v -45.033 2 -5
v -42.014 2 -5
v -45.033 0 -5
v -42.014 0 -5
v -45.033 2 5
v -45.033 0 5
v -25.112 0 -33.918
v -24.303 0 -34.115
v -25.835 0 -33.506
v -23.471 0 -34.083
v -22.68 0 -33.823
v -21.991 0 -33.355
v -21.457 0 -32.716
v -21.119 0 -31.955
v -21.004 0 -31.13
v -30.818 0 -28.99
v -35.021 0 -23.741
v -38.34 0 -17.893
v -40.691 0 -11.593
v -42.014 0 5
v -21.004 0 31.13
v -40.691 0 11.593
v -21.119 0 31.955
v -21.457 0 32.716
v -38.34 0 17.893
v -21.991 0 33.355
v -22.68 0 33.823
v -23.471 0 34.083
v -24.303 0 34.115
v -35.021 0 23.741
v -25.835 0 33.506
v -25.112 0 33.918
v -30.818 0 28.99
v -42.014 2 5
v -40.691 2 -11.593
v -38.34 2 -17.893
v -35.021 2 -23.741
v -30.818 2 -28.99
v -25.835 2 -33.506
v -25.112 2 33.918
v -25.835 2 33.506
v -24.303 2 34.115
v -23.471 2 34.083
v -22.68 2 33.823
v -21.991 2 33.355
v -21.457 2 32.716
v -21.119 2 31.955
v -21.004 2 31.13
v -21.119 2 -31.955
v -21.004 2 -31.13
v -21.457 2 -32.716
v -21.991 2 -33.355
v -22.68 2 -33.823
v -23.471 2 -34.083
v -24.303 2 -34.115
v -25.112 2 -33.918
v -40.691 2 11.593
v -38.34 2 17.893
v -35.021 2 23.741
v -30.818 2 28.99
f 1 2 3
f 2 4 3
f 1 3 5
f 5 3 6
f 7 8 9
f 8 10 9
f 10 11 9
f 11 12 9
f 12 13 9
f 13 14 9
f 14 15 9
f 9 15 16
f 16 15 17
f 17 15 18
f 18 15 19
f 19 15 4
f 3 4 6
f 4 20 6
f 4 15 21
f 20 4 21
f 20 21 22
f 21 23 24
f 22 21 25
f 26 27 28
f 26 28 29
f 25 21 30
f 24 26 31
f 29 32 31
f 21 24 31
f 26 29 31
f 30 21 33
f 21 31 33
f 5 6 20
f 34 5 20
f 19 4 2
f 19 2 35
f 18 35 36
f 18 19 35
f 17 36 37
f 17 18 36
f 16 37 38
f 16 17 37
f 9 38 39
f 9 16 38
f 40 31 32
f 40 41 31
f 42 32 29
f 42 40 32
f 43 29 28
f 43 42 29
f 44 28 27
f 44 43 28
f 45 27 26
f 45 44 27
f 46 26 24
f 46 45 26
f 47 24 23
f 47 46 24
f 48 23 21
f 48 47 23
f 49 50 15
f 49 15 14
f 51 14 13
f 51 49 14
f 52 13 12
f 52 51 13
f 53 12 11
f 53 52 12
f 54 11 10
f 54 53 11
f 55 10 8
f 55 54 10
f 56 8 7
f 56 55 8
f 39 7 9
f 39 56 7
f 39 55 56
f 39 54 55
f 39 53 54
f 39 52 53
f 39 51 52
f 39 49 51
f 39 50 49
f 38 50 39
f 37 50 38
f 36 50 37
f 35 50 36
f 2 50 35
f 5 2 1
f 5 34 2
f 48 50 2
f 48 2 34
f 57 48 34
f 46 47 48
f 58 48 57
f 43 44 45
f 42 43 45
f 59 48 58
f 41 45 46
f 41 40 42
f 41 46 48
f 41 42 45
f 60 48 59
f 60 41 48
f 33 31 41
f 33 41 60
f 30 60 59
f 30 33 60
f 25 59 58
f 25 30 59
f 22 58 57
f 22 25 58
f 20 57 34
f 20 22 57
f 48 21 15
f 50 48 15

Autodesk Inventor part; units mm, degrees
ref_plane "YZ Plane" through (0, 0, 0) normal (1, 0, 0) x (0, 1, 0)
ref_plane "XZ Plane" through (0, 0, 0) normal (0, 1, 0) x (-1, 0, 0)
ref_plane "XY Plane" through (0, 0, 0) normal (0, 0, 1) x (1, 0, 0)
sketch "Esquisse1" plane through (0, 0, 0) normal (0, 1, 0) x (-1, 0, 0)
  line L0 (18.0036, -31.6819) -> (18.0036, -41.5796)
  line L1 (18.0036, 33.4181) -> (18.0036, -31.6819)
  line L2 (18.0036, 33.4181) -> (18.0036, 41.5796)
  arc A0 (18.0036, -41.5796) -> (18.0036, 41.5796) centre (0, 0) ccw
  line L3 (21.0036, 36.7285) -> (21.0036, 33.4181)
  line L4 (21.0036, 33.4181) -> (21.0036, -31.6819)
  line L5 (21.0036, -31.6819) -> (21.0036, -36.7285)
  arc A1 (21.0036, -36.7285) -> (21.0036, 36.7285) centre (0, 0) ccw
  line L6 (45.0333, 5) -> (42.0135, 5)
  line L7 (42.0135, 5) -> (42.0135, -5)
  line L8 (42.0135, -5) -> (45.0333, -5)
  line L9 (45.0333, -5) -> (45.0333, 5)
  line L10 (45.0333, 5) -> (42.0135, -5) construction
  line L11 (42.0135, 5) -> (45.0333, -5) construction
  line L12 (49.818, 0) -> (34.3139, 0) construction
  point P0 (0, 0)
  point P1 (43.5234, 0)
  dimension "d7" = 90.62
  dimension "d8" = 3
  dimension "d9" = 10
extrude "Extrusion1" add sketch "Esquisse1" along normal blind 2 contours L8 A1 L6 L9 | L7 A1 | A1 L5 L4 L3 L7
fillet "Congé2" radius 3 2 edges at (-21.0036, 1, 36.7285) (-21.0036, 1, -36.7285)
sketch "Esquisse2" plane through (0, 2, 0) normal (0, 1, 0) x (1, 0, 0)
  point P0 (0, 0)
properties part number "Test_PCB"
